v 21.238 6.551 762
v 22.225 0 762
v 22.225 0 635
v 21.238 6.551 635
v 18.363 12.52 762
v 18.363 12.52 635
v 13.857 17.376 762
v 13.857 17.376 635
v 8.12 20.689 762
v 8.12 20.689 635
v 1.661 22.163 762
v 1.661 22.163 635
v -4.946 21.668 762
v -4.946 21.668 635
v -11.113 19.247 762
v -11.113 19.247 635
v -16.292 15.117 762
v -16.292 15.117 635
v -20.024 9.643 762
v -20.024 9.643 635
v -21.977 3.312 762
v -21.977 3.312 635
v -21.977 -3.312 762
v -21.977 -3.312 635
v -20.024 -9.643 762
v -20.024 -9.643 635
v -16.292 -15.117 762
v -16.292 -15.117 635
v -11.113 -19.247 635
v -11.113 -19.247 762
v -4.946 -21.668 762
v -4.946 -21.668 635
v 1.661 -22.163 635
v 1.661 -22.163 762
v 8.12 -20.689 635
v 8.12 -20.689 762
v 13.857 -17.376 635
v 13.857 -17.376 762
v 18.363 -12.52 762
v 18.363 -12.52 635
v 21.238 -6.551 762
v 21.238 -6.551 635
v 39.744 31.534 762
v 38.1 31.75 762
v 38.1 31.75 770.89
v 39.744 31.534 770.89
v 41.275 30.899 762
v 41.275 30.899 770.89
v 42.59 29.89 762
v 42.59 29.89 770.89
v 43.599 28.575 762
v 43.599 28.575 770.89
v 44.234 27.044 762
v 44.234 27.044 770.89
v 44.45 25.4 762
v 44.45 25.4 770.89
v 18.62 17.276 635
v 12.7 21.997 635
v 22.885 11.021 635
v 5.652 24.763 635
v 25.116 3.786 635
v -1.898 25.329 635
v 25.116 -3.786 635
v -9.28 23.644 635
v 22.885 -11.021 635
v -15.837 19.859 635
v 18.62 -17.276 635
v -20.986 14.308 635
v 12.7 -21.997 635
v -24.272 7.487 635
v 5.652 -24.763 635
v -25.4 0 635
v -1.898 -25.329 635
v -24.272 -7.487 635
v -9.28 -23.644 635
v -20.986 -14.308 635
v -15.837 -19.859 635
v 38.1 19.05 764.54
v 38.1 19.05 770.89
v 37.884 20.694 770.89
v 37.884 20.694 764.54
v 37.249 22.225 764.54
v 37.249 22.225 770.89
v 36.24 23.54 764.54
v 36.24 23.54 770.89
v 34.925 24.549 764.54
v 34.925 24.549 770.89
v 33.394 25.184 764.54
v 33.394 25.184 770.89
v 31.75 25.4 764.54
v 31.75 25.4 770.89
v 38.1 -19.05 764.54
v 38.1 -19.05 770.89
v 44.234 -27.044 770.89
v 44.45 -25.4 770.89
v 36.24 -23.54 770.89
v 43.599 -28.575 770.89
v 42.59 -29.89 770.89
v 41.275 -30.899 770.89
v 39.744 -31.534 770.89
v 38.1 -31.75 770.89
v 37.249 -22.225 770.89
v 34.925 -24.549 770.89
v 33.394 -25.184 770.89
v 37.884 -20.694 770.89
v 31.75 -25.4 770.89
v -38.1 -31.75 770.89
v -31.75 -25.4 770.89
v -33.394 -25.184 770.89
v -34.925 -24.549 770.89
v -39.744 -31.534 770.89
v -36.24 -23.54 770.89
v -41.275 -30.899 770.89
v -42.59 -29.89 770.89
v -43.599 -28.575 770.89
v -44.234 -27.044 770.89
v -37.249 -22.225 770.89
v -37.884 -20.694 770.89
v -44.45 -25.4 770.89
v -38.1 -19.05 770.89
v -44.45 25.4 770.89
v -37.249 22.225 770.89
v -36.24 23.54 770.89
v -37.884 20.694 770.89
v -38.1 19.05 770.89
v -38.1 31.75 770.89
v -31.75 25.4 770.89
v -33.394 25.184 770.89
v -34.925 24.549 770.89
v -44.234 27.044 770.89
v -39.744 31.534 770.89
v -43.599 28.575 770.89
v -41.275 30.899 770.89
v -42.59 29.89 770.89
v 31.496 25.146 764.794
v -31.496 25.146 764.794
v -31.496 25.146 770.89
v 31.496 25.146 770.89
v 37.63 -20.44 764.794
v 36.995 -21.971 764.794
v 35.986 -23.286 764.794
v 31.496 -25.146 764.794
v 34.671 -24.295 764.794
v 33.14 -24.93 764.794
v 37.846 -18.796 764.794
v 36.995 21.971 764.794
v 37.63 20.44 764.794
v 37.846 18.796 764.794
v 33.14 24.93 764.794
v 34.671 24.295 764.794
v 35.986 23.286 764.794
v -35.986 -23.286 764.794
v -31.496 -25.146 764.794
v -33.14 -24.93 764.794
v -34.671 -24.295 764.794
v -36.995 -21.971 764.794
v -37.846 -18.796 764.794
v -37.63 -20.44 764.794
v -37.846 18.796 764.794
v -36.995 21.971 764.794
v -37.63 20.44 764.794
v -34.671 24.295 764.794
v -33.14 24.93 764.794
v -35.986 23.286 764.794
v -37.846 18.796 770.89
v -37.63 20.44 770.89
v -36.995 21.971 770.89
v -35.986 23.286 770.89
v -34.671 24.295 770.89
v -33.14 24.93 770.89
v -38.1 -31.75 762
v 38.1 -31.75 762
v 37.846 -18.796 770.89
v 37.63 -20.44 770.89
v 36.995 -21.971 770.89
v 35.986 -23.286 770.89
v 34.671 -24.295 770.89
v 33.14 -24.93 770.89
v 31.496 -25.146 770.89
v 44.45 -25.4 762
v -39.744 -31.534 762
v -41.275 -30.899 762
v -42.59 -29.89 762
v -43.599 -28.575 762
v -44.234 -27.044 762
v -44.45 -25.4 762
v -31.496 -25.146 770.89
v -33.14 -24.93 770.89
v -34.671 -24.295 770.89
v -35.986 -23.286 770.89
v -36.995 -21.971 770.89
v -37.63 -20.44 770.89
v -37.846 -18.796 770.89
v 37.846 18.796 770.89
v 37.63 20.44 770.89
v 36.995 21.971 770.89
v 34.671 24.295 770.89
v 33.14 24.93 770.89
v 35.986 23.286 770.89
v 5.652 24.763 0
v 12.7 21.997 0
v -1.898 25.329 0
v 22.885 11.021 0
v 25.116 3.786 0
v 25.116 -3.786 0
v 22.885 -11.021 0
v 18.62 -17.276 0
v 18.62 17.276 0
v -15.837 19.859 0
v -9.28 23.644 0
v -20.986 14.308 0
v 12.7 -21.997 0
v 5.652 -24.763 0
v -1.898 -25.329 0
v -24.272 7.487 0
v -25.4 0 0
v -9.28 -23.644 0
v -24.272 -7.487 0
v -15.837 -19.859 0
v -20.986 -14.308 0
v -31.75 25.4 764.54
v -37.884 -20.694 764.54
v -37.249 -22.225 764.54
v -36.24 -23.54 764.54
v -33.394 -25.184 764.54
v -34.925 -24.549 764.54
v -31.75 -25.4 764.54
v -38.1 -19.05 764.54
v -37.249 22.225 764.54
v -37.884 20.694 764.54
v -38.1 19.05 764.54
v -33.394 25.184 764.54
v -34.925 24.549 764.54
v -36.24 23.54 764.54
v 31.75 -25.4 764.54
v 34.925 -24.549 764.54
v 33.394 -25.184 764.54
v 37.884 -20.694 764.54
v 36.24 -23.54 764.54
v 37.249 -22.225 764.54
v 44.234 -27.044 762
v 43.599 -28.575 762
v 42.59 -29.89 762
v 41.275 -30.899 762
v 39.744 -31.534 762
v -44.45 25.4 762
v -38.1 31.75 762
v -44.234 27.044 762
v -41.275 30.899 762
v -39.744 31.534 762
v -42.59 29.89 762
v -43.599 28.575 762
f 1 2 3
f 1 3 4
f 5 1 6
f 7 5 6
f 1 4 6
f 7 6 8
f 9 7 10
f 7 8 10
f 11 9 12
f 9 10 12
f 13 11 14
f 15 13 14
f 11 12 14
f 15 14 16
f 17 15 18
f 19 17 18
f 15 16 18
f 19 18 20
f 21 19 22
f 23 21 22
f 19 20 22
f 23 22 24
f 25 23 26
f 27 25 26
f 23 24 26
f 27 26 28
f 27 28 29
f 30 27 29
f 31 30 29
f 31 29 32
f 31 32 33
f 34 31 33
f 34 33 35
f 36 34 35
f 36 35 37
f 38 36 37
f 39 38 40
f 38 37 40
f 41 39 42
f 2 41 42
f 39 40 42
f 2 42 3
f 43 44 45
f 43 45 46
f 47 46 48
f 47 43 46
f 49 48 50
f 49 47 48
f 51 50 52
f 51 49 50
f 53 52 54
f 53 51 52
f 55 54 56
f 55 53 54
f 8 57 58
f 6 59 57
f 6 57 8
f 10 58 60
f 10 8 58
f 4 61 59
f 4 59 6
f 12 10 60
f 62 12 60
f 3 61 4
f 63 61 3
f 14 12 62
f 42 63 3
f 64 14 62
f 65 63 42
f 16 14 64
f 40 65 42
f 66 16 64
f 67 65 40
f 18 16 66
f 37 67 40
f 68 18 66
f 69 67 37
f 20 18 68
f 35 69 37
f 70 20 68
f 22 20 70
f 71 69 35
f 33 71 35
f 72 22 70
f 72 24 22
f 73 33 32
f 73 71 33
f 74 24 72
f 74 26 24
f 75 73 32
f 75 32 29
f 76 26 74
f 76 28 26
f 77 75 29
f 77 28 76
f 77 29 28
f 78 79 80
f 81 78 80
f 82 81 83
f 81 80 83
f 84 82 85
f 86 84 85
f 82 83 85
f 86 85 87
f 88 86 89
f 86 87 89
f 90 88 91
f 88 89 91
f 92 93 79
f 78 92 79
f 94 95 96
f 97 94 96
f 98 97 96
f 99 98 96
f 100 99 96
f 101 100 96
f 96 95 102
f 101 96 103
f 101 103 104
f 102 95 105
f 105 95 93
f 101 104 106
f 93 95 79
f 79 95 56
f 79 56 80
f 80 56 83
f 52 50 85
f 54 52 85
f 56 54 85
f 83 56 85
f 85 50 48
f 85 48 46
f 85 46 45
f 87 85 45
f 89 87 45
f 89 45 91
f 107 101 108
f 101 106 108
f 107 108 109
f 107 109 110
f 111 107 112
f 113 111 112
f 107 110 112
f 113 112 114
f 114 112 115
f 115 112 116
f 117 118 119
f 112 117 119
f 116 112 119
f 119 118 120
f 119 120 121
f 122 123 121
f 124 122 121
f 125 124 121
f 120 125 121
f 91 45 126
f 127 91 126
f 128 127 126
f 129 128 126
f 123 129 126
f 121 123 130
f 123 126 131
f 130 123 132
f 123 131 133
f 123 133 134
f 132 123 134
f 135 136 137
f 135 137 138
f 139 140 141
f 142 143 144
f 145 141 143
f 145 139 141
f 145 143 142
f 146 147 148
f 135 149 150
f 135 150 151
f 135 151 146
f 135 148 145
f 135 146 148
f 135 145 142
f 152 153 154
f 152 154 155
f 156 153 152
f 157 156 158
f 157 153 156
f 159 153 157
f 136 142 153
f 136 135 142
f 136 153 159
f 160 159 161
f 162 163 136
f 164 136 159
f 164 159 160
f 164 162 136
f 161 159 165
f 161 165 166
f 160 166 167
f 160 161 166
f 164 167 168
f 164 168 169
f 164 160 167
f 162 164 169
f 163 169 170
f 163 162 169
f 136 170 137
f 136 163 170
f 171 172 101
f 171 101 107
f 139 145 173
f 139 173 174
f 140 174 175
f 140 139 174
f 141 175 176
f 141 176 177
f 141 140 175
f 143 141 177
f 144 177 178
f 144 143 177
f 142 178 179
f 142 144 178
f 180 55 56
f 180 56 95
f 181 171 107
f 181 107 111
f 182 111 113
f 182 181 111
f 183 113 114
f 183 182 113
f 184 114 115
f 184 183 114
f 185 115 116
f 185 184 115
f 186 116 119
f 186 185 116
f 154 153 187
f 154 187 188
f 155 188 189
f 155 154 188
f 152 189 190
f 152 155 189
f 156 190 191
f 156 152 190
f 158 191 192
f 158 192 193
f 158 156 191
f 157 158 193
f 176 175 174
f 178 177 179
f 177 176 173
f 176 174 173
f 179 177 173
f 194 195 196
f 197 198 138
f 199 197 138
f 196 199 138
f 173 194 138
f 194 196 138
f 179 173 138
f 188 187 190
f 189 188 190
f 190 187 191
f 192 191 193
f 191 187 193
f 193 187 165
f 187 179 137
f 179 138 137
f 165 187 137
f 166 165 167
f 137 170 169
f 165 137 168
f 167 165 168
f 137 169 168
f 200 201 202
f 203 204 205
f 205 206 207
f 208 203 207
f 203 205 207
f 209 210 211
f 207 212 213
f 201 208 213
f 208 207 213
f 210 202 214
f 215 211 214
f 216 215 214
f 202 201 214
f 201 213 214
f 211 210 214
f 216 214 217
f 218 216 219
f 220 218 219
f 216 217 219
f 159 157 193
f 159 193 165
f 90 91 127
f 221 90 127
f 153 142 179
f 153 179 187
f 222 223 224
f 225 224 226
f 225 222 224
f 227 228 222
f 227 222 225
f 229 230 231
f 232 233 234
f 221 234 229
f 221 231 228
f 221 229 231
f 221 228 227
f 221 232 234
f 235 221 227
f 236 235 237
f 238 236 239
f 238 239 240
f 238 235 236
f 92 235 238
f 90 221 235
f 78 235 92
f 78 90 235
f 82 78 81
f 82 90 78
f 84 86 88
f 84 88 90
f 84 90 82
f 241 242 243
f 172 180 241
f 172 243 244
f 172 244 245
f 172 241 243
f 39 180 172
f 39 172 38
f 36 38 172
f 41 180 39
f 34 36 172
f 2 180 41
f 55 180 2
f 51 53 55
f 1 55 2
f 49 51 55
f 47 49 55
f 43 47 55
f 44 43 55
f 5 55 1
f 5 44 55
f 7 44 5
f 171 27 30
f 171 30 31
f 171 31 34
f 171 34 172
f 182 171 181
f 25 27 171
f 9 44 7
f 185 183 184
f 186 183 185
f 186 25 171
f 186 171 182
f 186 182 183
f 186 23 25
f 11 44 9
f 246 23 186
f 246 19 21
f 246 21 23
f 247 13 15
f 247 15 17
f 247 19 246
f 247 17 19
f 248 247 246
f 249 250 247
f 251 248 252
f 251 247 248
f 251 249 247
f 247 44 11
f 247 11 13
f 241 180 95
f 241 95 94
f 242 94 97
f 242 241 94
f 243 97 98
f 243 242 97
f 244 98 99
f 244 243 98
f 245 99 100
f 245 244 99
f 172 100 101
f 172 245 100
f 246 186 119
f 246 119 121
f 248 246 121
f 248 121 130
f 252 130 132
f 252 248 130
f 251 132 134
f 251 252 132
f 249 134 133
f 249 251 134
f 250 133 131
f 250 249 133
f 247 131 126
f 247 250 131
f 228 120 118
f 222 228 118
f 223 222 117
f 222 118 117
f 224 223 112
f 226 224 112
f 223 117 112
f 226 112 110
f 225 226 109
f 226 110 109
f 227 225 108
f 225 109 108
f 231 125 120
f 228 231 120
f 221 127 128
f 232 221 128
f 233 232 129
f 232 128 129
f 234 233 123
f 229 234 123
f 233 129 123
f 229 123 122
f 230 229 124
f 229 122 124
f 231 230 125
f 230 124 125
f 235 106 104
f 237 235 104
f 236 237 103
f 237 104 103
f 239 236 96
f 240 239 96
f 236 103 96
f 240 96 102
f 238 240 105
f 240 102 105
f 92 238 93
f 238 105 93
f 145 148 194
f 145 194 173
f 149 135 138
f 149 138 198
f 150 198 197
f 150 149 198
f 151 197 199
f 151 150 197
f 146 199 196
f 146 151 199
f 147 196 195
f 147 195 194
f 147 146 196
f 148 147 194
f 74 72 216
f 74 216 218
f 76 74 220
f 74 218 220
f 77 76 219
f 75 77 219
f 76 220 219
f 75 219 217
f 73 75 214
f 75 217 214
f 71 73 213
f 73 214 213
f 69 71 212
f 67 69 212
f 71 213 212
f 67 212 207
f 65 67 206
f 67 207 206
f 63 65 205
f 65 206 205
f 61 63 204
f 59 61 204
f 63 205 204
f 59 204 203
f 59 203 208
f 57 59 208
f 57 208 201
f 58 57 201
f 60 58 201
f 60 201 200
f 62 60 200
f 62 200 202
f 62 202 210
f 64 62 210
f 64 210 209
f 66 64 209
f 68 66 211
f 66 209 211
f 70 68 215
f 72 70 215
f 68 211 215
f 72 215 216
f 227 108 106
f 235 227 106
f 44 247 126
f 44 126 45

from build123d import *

# Parameters (mm, degrees)
SKETCH1_R           = 25.4
BOSS_EXTRUDE1_DEPTH = 635
SKETCH2_R           = 22.225
BOSS_EXTRUDE2_DEPTH = 127
BOSS_EXTRUDE3_DEPTH = 8.89
CUT_EXTRUDE1_DEPTH  = 6.35
BOSS_EXTRUDE5_DEPTH = 6.096


with BuildPart() as part:
    # Sketch1 → Boss-Extrude1 (new body)
    with BuildSketch(Plane.XY):
        with Locations(Location((0, 0, 0), (0, 0, 180))):
            Circle(SKETCH1_R)
    extrude(amount=BOSS_EXTRUDE1_DEPTH)

    # Sketch2 → Boss-Extrude2 (add)
    with BuildSketch(Plane.XY.offset(635)):
        Circle(SKETCH2_R)
    extrude(amount=BOSS_EXTRUDE2_DEPTH)

    # Sketch3 → Boss-Extrude3 (add)
    with BuildSketch(Plane.XY.offset(762)):
        with BuildLine():
            Line((-38.1, 31.75), (38.1, 31.75))
            ThreePointArc((38.1, 31.75), (42.590128061, 29.890128061), (44.45, 25.4))
            Line((44.45, 25.4), (44.45, -25.4))
            ThreePointArc((44.45, -25.4), (42.590128061, -29.890128061), (38.1, -31.75))
            Line((38.1, -31.75), (-38.1, -31.75))
            ThreePointArc((-38.1, -31.75), (-42.590128061, -29.890128061), (-44.45, -25.4))
            Line((-44.45, -25.4), (-44.45, 25.4))
            ThreePointArc((-44.45, 25.4), (-42.590128061, 29.890128061), (-38.1, 31.75))
        make_face()
    extrude(amount=BOSS_EXTRUDE3_DEPTH)

    # Sketch4 → Cut-Extrude1 (cut)
    with BuildSketch(Plane.XY.offset(770.89)):
        with BuildLine():
            Line((-31.75, -25.4), (31.75, -25.4))
            ThreePointArc((31.75, -25.4), (36.240128061, -23.540128061), (38.1, -19.05))
            Line((38.1, -19.05), (38.1, 19.05))
            ThreePointArc((38.1, 19.05), (36.240128061, 23.540128061), (31.75, 25.4))
            Line((31.75, 25.4), (-31.75, 25.4))
            ThreePointArc((-31.75, 25.4), (-36.240128061, 23.540128061), (-38.1, 19.05))
            Line((-38.1, 19.05), (-38.1, -19.05))
            ThreePointArc((-38.1, -19.05), (-36.240128061, -23.540128061), (-31.75, -25.4))
        make_face()
    extrude(amount=-CUT_EXTRUDE1_DEPTH, mode=Mode.SUBTRACT)


with BuildPart() as body_2:
    # Sketch5 → Boss-Extrude5 (new body)
    with BuildSketch(Plane.XY.offset(764.794)):
        with BuildLine():
            Line((-31.496, 25.146), (31.496, 25.146))
            ThreePointArc((31.496, 25.146), (35.986128061, 23.286128061), (37.846, 18.796))
            Line((37.846, 18.796), (37.846, -18.796))
            ThreePointArc((37.846, -18.796), (35.986128061, -23.286128061), (31.496, -25.146))
            Line((31.496, -25.146), (-31.496, -25.146))
            ThreePointArc((-31.496, -25.146), (-35.986128061, -23.286128061), (-37.846, -18.796))
            Line((-37.846, -18.796), (-37.846, 18.796))
            ThreePointArc((-37.846, 18.796), (-35.986128061, 23.286128061), (-31.496, 25.146))
        make_face()
    extrude(amount=BOSS_EXTRUDE5_DEPTH)


solid = Compound([part.part, body_2.part])
